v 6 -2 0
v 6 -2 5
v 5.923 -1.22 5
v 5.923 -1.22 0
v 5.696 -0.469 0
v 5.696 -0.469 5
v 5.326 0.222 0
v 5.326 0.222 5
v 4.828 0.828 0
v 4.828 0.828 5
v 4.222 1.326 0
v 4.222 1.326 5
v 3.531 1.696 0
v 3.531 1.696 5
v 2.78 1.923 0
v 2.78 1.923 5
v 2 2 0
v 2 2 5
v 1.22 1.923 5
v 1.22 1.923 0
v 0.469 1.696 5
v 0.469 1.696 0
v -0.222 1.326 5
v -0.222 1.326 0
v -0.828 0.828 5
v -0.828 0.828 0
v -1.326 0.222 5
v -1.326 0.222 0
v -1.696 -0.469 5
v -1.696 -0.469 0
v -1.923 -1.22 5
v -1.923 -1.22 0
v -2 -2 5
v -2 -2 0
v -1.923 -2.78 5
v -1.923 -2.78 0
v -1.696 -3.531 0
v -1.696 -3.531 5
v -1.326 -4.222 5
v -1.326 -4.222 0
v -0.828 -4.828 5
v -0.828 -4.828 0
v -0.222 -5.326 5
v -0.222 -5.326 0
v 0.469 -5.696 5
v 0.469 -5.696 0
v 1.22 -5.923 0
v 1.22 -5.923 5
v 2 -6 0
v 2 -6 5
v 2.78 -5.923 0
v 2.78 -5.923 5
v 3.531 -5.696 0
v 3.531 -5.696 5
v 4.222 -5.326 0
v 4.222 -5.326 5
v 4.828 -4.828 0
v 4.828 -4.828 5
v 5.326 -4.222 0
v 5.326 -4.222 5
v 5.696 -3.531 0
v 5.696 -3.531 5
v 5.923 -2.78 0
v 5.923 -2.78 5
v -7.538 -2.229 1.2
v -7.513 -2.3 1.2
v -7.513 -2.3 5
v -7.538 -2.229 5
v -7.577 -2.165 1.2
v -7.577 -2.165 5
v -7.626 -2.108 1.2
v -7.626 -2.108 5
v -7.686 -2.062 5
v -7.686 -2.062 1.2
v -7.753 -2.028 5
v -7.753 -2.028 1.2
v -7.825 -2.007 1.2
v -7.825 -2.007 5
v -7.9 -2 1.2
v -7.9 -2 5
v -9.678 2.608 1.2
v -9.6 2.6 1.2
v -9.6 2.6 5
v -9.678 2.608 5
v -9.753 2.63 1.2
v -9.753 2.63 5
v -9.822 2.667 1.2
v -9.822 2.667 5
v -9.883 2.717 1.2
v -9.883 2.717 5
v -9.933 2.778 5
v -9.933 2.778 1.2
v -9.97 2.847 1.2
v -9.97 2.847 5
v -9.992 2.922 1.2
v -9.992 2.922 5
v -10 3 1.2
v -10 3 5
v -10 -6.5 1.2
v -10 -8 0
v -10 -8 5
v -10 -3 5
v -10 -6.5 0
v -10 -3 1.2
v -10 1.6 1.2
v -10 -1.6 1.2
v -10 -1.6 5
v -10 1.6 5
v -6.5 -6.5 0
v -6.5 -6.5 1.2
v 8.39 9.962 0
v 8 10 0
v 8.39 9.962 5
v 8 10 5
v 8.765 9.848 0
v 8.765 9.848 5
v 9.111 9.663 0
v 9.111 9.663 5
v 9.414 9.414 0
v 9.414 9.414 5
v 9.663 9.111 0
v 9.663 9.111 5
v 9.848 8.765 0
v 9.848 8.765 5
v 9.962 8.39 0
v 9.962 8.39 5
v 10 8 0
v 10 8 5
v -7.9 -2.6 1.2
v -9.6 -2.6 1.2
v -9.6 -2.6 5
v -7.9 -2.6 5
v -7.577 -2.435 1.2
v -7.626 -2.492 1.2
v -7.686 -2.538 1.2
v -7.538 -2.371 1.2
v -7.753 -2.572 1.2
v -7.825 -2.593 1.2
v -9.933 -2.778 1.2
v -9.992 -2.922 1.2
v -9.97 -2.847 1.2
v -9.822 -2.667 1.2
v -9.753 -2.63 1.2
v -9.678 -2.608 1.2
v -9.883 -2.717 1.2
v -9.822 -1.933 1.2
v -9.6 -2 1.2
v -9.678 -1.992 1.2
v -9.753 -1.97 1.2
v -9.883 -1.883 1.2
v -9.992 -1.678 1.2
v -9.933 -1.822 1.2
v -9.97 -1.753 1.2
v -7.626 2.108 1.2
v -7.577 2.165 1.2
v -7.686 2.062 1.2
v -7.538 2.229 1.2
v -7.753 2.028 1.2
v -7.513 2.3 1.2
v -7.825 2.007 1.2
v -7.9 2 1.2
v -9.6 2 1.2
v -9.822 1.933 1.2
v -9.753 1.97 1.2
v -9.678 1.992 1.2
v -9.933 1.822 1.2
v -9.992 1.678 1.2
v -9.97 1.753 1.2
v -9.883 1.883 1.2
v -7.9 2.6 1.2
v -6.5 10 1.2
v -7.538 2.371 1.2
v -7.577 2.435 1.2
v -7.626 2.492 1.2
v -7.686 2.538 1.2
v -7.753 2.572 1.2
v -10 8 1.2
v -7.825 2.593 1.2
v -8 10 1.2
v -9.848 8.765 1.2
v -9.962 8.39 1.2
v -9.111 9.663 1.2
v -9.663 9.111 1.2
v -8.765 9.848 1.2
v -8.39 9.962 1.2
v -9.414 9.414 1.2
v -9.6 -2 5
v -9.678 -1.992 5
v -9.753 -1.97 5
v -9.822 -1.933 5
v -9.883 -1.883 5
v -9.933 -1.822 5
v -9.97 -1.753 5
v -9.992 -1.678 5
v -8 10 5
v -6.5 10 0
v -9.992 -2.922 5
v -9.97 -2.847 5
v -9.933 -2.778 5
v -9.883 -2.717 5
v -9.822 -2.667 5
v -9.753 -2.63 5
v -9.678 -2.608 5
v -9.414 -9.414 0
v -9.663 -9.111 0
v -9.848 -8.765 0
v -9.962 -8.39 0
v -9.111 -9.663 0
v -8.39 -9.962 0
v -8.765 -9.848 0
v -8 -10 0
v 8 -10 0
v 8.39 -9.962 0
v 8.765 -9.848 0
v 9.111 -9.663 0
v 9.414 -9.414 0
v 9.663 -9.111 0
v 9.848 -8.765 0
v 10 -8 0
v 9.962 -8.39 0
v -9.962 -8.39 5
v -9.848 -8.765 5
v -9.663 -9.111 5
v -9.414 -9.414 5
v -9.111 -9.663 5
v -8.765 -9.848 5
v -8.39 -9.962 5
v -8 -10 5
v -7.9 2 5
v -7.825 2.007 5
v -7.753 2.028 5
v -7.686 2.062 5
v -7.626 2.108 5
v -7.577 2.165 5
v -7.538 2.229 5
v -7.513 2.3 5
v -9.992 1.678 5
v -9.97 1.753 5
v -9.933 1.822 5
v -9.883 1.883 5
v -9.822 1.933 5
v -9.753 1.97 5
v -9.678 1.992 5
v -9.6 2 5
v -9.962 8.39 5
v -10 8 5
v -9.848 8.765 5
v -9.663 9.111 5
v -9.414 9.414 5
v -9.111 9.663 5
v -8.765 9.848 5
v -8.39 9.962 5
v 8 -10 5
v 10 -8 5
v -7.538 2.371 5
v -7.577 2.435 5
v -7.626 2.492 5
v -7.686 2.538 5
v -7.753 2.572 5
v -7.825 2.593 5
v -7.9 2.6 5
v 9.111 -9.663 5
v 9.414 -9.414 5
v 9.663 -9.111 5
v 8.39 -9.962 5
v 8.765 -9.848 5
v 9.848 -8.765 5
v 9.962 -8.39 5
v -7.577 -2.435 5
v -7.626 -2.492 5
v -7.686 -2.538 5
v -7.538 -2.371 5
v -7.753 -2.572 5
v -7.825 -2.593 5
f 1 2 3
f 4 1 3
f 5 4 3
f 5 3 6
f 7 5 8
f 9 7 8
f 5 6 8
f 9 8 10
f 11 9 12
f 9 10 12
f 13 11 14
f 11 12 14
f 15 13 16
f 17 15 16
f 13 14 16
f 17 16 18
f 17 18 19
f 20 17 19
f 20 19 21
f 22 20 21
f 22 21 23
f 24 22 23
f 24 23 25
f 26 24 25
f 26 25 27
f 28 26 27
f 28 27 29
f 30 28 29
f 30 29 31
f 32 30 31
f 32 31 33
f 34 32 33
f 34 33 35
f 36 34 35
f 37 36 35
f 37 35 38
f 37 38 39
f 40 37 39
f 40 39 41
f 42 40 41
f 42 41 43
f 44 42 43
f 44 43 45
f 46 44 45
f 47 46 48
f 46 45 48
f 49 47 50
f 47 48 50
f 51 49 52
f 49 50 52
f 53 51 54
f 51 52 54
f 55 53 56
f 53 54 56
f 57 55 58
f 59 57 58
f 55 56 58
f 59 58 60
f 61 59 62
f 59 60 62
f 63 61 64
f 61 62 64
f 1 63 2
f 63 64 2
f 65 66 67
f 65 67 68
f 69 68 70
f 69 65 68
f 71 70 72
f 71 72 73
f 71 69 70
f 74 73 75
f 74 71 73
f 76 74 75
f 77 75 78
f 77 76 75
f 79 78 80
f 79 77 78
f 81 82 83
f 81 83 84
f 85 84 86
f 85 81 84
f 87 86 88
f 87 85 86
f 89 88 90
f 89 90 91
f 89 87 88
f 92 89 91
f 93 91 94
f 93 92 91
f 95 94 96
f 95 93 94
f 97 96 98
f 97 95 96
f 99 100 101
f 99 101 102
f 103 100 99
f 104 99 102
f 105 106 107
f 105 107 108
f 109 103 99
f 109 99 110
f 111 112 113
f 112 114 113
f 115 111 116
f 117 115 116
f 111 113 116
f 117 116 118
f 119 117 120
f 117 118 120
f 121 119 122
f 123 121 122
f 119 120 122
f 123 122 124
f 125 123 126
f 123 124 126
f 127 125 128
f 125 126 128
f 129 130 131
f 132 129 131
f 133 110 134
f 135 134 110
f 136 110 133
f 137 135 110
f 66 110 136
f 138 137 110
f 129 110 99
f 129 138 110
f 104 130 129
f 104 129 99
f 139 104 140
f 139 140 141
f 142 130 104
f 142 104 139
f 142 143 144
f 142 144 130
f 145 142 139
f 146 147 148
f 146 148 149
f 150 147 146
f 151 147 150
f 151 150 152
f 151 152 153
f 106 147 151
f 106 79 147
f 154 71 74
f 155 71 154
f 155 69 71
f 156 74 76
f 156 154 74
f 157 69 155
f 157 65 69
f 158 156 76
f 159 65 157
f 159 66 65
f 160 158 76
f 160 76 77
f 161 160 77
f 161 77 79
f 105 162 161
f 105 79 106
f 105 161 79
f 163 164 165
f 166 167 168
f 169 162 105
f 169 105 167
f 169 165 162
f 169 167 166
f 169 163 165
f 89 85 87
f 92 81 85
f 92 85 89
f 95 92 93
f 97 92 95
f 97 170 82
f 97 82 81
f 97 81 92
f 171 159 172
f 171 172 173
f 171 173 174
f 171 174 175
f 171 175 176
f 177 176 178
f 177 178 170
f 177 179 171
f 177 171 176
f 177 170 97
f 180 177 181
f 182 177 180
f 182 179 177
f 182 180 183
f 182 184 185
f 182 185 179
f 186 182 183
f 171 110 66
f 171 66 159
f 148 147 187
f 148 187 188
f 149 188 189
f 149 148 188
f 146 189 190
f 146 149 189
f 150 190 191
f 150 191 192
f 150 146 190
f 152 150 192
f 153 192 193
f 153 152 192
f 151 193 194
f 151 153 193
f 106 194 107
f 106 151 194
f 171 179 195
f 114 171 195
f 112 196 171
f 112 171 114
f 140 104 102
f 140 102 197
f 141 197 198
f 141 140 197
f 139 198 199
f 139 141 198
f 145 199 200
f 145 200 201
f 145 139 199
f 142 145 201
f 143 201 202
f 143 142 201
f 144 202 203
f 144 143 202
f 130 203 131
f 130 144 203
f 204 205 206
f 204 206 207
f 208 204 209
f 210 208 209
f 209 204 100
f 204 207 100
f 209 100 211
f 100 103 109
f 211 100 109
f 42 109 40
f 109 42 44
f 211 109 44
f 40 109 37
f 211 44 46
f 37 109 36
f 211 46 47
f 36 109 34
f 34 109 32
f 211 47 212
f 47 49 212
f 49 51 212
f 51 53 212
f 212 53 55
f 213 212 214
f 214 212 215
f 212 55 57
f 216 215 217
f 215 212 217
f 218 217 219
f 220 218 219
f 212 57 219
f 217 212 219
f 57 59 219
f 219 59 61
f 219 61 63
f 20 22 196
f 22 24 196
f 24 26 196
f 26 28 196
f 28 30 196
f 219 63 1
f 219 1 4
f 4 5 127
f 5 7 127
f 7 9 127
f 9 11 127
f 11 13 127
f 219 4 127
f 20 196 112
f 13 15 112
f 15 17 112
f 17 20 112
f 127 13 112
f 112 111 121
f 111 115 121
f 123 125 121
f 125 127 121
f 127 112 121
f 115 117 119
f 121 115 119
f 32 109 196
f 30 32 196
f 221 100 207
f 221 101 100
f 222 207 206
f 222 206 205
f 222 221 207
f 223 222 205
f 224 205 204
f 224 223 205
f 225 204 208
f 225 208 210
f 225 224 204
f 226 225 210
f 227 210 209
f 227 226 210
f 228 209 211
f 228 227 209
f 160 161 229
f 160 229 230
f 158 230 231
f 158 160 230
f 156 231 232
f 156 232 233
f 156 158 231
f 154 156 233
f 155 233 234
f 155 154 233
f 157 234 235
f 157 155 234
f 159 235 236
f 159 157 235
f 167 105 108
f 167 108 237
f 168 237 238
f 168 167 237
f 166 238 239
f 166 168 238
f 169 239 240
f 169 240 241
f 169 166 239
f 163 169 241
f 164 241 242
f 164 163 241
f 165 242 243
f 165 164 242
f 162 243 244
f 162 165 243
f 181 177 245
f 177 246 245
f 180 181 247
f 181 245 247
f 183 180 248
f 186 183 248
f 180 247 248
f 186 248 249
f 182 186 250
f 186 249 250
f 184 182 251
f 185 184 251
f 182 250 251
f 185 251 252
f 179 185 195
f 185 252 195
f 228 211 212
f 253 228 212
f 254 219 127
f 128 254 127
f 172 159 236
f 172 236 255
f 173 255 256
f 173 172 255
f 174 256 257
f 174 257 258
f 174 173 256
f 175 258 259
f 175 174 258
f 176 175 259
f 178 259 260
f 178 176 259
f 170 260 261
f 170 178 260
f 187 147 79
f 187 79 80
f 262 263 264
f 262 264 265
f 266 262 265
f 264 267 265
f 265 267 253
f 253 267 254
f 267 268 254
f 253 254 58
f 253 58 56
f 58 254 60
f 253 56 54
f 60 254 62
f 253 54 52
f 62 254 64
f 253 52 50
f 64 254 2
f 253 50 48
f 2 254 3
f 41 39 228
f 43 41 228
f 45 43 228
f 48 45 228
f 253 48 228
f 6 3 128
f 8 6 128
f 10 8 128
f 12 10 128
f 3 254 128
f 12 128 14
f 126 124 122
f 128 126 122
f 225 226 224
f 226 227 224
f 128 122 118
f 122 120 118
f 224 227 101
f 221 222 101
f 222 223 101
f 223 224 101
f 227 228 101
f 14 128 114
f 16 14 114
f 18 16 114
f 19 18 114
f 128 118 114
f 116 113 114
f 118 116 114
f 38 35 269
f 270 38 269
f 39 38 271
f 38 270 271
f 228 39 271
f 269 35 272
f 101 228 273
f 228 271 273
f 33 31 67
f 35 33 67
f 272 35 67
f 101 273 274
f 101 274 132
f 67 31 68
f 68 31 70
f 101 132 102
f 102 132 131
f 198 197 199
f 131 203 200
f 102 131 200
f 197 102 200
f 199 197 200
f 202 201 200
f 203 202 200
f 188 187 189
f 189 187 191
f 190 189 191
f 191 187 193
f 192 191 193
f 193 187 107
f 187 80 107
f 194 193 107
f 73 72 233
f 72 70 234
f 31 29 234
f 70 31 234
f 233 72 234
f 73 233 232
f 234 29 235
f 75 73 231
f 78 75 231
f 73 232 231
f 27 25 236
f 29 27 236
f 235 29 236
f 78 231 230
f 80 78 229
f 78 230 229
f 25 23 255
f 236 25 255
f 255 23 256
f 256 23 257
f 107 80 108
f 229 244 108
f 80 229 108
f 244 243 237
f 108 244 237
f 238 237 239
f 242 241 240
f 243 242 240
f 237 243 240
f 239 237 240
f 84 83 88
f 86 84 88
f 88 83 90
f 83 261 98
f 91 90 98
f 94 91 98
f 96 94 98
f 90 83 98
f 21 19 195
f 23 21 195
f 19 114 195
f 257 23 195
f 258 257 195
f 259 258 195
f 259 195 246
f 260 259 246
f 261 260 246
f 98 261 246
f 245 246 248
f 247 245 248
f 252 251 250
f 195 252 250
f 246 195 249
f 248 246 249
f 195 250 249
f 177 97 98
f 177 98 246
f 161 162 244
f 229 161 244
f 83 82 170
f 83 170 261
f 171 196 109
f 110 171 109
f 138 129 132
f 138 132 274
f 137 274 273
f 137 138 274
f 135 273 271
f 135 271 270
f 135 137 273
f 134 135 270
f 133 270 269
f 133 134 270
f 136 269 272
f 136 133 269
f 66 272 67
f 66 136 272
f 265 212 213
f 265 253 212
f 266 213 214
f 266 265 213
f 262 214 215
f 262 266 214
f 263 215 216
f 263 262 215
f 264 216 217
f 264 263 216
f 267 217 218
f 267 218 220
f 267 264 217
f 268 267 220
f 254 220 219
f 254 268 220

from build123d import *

# Parameters (mm, degrees)
F0_W        = 20
F0_H        = 20
F1_DEPTH    = 5
F2_W        = 3.5
F2_H        = 16.5
F3_DEPTH    = 1.2
F4_R        = 4
F5_DEPTH    = 5.001
F6_R        = 2
F7_W        = 0.6
F7_H        = 3.8
F8_DEPTH    = 2.5
F9_T1_DEPTH = 3.8
F9_T3_DEPTH = 5.8


# Not quite as in the source:
# - a fillet or chamfer that OpenCascade refuses, or shapes differently, is made with other operations: its cross-section is extruded or revolved along the edge and cut away or added


with BuildPart() as f1:
    # F0 (on Top) → F1 (new body)
    with BuildSketch(Plane.XY):
        Rectangle(F0_W, F0_H)
    extrude(amount=F1_DEPTH)

    # F2 (on face) → F3 (cut)
    with BuildSketch(Plane(origin=(0, 0, 0), x_dir=(1, 0, 0), z_dir=(0, 0, -1))):
        with Locations((-8.25, -1.75)):
            Rectangle(F2_W, F2_H)
    extrude(amount=-F3_DEPTH, mode=Mode.SUBTRACT)

    # F4 (on face) → F5 (cut, through all)
    with BuildSketch(Plane.XY.offset(5)):
        with Locations((2, -2)):
            Circle(F4_R)
    extrude(amount=-F5_DEPTH, mode=Mode.SUBTRACT)

    # F6
    f6_edges = [f1.edges().sort_by_distance(p)[0] for p in [
        (10, -10, 2.5),
        (-10, -10, 2.5),
        (-10, 10, 3.1),
        (10, 10, 2.5),
    ]]
    fillet(f6_edges, radius=F6_R)

    # F7 (on face) → F8 (cut)
    with BuildSketch(Plane(origin=(-10, 0, 0), x_dir=(0, -1, 0), z_dir=(-1, 0, 0))):
        with Locations((-2.3, 3.1)):
            Rectangle(F7_W, F7_H)
        with Locations((2.3, 3.1)):
            Rectangle(F7_W, F7_H)
    extrude(amount=-F8_DEPTH, mode=Mode.SUBTRACT)

    # F9: fillet of radius 0.4 on 8 edges, made by hand

    # F9_s2 → F9_t1 (join)
    with BuildSketch(Plane.XY.offset(1.2)):
        with BuildLine():
            ThreePointArc((-7.5, 2.2), (-7.6171572875, 2.4828427125), (-7.9, 2.6))
            Line((-7.9, 2.6), (-7.5, 2.6))
            Line((-7.5, 2.6), (-7.5, 2.2))
        make_face()
        with BuildLine():
            ThreePointArc((-7.9, 2), (-7.6171572875, 2.1171572875), (-7.5, 2.4))
            Line((-7.5, 2.4), (-7.5, 2))
            Line((-7.5, 2), (-7.9, 2))
        make_face()
        with BuildLine():
            ThreePointArc((-7.9, -2.6), (-7.6171572875, -2.4828427125), (-7.5, -2.2))
            Line((-7.5, -2.2), (-7.5, -2.6))
            Line((-7.5, -2.6), (-7.9, -2.6))
        make_face()
        with BuildLine():
            ThreePointArc((-7.5, -2.4), (-7.6171572875, -2.1171572875), (-7.9, -2))
            Line((-7.9, -2), (-7.5, -2))
            Line((-7.5, -2), (-7.5, -2.4))
        make_face()
    extrude(amount=F9_T1_DEPTH)

    # F9_s4 → F9_t3 (cut)
    with BuildSketch(Plane.XY.offset(0.2)):
        with BuildLine():
            ThreePointArc((-10, 1.6), (-9.8828427125, 1.8828427125), (-9.6, 2))
            Line((-9.6, 2), (-10, 2))
            Line((-10, 2), (-10, 1.6))
        make_face()
        with BuildLine():
            ThreePointArc((-9.6, -2), (-9.8828427125, -1.8828427125), (-10, -1.6))
            Line((-10, -1.6), (-10, -2))
            Line((-10, -2), (-9.6, -2))
        make_face()
        with BuildLine():
            ThreePointArc((-10, -3), (-9.8828427125, -2.7171572875), (-9.6, -2.6))
            Line((-9.6, -2.6), (-10, -2.6))
            Line((-10, -2.6), (-10, -3))
        make_face()
        with BuildLine():
            ThreePointArc((-9.6, 2.6), (-9.8828427125, 2.7171572875), (-10, 3))
            Line((-10, 3), (-10, 2.6))
            Line((-10, 2.6), (-9.6, 2.6))
        make_face()
    extrude(amount=F9_T3_DEPTH, mode=Mode.SUBTRACT)


solid = f1.part
